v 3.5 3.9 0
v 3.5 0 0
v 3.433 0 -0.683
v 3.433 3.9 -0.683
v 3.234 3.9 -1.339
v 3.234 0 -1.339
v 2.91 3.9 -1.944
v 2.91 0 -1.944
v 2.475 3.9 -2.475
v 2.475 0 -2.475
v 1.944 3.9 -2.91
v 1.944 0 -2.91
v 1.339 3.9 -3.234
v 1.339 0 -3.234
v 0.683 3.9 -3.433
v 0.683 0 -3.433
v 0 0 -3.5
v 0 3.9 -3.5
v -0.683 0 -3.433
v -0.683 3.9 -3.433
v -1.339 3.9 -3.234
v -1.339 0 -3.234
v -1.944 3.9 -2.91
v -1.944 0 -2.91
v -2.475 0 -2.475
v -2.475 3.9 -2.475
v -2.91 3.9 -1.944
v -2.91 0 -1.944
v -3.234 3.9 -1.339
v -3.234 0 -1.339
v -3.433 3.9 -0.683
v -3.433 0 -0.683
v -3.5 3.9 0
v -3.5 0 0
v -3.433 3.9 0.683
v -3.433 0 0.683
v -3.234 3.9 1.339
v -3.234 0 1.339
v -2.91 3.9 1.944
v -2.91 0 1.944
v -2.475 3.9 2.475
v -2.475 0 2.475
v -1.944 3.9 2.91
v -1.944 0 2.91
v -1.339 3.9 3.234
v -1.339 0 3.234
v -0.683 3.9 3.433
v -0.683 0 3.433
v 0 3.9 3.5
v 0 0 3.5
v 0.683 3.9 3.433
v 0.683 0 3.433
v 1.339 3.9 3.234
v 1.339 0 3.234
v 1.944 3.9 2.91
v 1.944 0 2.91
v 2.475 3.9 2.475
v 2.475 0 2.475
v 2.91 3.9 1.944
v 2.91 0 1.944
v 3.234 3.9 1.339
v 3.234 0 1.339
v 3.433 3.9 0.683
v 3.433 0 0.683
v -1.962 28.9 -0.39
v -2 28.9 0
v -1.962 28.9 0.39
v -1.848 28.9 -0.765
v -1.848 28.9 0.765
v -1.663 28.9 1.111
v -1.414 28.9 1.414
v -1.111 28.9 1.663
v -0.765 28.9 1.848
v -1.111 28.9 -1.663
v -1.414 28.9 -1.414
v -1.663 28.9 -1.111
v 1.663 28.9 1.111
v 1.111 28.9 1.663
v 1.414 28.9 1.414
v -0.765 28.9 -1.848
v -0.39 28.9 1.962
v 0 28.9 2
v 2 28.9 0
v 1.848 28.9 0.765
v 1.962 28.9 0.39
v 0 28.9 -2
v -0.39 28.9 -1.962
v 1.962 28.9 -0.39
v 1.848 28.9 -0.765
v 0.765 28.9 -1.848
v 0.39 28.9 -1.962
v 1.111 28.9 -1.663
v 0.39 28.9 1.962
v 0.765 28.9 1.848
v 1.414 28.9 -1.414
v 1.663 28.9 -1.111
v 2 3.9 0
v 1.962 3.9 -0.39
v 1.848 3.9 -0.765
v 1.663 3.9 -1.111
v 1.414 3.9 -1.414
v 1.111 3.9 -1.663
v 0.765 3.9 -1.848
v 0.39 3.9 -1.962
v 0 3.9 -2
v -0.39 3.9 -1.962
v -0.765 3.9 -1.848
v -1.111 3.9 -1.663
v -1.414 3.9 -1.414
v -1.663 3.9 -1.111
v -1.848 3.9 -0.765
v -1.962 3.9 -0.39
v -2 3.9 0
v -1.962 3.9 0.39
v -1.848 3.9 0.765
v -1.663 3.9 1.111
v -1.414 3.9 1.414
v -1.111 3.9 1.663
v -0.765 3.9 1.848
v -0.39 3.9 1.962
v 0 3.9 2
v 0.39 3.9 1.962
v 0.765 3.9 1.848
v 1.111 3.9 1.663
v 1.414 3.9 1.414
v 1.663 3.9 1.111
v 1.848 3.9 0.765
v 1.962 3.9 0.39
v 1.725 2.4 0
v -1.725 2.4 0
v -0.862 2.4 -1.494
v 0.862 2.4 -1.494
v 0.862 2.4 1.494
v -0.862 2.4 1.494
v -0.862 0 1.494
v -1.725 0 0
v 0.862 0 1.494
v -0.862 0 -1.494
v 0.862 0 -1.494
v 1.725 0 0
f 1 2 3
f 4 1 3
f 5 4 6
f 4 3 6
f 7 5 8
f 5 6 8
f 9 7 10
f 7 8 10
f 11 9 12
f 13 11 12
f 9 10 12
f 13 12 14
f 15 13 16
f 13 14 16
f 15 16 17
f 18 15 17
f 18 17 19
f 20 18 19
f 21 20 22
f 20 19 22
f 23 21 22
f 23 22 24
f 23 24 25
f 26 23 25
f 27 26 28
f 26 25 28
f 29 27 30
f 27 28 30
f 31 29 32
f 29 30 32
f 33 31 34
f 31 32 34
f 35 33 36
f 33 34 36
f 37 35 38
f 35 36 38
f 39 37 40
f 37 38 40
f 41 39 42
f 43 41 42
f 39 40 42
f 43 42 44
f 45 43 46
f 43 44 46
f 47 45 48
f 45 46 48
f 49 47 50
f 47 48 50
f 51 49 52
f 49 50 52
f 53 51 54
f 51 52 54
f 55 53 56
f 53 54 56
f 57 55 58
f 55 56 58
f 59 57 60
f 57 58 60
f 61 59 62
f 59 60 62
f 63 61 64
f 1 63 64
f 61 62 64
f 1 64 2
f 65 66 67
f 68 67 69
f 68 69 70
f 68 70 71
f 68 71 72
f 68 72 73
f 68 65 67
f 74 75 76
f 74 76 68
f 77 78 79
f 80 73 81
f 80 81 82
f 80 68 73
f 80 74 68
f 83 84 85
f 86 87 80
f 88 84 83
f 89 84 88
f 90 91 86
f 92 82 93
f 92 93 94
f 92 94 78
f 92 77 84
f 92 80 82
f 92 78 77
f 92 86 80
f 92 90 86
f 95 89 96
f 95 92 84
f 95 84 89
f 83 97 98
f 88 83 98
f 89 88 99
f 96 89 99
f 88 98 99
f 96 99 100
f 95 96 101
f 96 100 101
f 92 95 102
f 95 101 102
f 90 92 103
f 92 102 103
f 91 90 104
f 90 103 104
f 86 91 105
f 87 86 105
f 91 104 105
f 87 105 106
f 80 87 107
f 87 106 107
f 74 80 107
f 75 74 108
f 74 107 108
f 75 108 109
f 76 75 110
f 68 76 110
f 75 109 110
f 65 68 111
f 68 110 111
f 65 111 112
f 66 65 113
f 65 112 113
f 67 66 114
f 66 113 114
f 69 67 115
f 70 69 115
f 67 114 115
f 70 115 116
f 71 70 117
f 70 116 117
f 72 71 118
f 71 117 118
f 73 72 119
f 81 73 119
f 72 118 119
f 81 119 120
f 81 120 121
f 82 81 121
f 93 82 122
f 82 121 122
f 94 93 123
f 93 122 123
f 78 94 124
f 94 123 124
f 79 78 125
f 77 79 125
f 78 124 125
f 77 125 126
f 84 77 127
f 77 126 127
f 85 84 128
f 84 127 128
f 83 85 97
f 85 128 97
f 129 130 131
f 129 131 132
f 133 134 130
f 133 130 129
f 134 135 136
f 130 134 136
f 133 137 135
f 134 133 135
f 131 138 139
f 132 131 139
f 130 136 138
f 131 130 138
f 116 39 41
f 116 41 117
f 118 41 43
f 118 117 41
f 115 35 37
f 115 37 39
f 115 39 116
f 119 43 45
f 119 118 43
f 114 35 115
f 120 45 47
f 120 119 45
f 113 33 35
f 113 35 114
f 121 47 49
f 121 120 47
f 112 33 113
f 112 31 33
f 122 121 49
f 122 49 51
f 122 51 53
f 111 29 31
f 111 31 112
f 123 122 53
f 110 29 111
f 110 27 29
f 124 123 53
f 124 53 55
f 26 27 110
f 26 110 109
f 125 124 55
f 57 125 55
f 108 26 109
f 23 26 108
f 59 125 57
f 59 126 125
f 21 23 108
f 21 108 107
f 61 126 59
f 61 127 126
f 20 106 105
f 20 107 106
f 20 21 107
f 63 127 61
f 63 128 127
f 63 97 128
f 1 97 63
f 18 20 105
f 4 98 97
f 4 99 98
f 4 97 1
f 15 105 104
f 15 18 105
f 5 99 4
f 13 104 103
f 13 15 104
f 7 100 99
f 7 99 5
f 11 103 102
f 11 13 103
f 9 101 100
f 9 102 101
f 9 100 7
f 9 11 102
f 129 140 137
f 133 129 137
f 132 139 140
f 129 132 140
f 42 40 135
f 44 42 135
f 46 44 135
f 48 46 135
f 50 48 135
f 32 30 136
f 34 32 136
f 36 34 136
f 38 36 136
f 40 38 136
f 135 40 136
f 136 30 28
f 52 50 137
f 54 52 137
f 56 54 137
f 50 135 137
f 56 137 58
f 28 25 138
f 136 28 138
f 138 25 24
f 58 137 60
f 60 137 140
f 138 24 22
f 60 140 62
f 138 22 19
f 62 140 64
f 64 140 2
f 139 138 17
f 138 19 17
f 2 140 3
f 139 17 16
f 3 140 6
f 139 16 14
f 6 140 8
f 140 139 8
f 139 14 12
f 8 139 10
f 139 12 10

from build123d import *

# Parameters (mm, degrees)
SKETCH_1_R          = 3.5
EXTRUDE_1_DEPTH     = 3.9
SKETCH_2_R          = 2
EXTRUDE_2_DEPTH     = 25
CUT_EXTRUDE_1_DEPTH = 2.4


with BuildPart() as part:
    # 草图1 → 凸台-拉伸1 (new body)
    with BuildSketch(Plane(origin=(0, 0, 0), x_dir=(1, 0, 0), z_dir=(0, 1, 0))):
        Circle(SKETCH_1_R)
    extrude(amount=EXTRUDE_1_DEPTH)

    # 草图2 → 凸台-拉伸2 (add)
    with BuildSketch(Plane(origin=(0, 3.9, 0), x_dir=(1, 0, 0), z_dir=(0, 1, 0))):
        Circle(SKETCH_2_R)
    extrude(amount=EXTRUDE_2_DEPTH)

    # 草图3 → 切除-拉伸1 (cut)
    with BuildSketch(Plane.XZ):
        Polygon((1.725, 0), (0.8625, 1.493893822), (-0.8625, 1.493893822), (-1.725, 0), (-0.8625, -1.493893822), (0.8625, -1.493893822), align=None)
    extrude(amount=-CUT_EXTRUDE_1_DEPTH, mode=Mode.SUBTRACT)


solid = part.part
